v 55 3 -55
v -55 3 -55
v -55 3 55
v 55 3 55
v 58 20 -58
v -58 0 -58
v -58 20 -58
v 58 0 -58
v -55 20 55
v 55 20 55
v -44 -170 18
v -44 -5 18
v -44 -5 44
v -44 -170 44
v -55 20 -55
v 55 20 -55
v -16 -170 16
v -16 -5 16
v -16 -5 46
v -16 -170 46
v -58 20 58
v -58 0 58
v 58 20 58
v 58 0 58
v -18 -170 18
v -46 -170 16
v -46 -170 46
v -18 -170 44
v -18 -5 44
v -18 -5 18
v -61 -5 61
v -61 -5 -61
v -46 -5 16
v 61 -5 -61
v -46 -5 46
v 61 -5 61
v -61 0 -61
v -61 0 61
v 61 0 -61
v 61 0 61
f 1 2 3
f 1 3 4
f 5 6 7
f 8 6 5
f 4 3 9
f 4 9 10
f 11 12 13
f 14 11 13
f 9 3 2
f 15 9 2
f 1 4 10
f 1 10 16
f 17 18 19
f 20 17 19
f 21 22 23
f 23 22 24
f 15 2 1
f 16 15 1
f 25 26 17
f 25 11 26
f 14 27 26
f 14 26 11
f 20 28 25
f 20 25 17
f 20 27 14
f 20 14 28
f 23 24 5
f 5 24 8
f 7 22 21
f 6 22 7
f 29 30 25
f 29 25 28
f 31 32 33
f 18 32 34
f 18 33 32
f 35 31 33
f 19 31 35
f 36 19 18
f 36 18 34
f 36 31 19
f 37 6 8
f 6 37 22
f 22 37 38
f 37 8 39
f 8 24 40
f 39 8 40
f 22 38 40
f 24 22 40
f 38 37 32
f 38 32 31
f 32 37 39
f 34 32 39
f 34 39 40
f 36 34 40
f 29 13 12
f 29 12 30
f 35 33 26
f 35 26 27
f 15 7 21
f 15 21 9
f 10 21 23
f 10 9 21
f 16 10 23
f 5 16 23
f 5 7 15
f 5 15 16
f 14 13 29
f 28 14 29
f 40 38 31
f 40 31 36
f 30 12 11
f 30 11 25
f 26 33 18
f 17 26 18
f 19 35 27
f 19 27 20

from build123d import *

# Parameters (mm, degrees)
SKETCH_1_W      = 116
SKETCH_1_H      = 116
EXTRUDE_1_DEPTH = 20
SHELL_1_T       = -3
SKETCH_2_W      = 122
SKETCH_2_H      = 122
EXTRUDE_2_DEPTH = 5
SKETCH_4_W      = 30
SKETCH_4_H      = 30
SKETCH_4_W_2    = 26
SKETCH_4_H_2    = 26
EXTRUDE_3_DEPTH = 165


with BuildPart() as part:
    # 草图1 → 凸台-拉伸1 (new body)
    with BuildSketch(Plane(origin=(0, 0, 0), x_dir=(1, 0, 0), z_dir=(0, 1, 0))):
        Rectangle(SKETCH_1_W, SKETCH_1_H)
    extrude(amount=EXTRUDE_1_DEPTH)

    # 抽壳1
    shell_1_openings = [part.faces().sort_by_distance(p)[0] for p in [
        (0, 20, 0),
    ]]
    offset(amount=SHELL_1_T, openings=shell_1_openings, kind=Kind.INTERSECTION)

    # 草图2 → 凸台-拉伸2 (add)
    with BuildSketch(Plane.XZ):
        Rectangle(SKETCH_2_W, SKETCH_2_H)
    extrude(amount=EXTRUDE_2_DEPTH)

    # 草图4 → 凸台-拉伸3 (add)
    with BuildSketch(Plane.XZ.offset(5)):
        with Locations((-31, 31)):
            Rectangle(SKETCH_4_W, SKETCH_4_H)
        with Locations((-31, 31)):
            Rectangle(SKETCH_4_W_2, SKETCH_4_H_2, mode=Mode.SUBTRACT)
    extrude(amount=EXTRUDE_3_DEPTH)


solid = part.part
